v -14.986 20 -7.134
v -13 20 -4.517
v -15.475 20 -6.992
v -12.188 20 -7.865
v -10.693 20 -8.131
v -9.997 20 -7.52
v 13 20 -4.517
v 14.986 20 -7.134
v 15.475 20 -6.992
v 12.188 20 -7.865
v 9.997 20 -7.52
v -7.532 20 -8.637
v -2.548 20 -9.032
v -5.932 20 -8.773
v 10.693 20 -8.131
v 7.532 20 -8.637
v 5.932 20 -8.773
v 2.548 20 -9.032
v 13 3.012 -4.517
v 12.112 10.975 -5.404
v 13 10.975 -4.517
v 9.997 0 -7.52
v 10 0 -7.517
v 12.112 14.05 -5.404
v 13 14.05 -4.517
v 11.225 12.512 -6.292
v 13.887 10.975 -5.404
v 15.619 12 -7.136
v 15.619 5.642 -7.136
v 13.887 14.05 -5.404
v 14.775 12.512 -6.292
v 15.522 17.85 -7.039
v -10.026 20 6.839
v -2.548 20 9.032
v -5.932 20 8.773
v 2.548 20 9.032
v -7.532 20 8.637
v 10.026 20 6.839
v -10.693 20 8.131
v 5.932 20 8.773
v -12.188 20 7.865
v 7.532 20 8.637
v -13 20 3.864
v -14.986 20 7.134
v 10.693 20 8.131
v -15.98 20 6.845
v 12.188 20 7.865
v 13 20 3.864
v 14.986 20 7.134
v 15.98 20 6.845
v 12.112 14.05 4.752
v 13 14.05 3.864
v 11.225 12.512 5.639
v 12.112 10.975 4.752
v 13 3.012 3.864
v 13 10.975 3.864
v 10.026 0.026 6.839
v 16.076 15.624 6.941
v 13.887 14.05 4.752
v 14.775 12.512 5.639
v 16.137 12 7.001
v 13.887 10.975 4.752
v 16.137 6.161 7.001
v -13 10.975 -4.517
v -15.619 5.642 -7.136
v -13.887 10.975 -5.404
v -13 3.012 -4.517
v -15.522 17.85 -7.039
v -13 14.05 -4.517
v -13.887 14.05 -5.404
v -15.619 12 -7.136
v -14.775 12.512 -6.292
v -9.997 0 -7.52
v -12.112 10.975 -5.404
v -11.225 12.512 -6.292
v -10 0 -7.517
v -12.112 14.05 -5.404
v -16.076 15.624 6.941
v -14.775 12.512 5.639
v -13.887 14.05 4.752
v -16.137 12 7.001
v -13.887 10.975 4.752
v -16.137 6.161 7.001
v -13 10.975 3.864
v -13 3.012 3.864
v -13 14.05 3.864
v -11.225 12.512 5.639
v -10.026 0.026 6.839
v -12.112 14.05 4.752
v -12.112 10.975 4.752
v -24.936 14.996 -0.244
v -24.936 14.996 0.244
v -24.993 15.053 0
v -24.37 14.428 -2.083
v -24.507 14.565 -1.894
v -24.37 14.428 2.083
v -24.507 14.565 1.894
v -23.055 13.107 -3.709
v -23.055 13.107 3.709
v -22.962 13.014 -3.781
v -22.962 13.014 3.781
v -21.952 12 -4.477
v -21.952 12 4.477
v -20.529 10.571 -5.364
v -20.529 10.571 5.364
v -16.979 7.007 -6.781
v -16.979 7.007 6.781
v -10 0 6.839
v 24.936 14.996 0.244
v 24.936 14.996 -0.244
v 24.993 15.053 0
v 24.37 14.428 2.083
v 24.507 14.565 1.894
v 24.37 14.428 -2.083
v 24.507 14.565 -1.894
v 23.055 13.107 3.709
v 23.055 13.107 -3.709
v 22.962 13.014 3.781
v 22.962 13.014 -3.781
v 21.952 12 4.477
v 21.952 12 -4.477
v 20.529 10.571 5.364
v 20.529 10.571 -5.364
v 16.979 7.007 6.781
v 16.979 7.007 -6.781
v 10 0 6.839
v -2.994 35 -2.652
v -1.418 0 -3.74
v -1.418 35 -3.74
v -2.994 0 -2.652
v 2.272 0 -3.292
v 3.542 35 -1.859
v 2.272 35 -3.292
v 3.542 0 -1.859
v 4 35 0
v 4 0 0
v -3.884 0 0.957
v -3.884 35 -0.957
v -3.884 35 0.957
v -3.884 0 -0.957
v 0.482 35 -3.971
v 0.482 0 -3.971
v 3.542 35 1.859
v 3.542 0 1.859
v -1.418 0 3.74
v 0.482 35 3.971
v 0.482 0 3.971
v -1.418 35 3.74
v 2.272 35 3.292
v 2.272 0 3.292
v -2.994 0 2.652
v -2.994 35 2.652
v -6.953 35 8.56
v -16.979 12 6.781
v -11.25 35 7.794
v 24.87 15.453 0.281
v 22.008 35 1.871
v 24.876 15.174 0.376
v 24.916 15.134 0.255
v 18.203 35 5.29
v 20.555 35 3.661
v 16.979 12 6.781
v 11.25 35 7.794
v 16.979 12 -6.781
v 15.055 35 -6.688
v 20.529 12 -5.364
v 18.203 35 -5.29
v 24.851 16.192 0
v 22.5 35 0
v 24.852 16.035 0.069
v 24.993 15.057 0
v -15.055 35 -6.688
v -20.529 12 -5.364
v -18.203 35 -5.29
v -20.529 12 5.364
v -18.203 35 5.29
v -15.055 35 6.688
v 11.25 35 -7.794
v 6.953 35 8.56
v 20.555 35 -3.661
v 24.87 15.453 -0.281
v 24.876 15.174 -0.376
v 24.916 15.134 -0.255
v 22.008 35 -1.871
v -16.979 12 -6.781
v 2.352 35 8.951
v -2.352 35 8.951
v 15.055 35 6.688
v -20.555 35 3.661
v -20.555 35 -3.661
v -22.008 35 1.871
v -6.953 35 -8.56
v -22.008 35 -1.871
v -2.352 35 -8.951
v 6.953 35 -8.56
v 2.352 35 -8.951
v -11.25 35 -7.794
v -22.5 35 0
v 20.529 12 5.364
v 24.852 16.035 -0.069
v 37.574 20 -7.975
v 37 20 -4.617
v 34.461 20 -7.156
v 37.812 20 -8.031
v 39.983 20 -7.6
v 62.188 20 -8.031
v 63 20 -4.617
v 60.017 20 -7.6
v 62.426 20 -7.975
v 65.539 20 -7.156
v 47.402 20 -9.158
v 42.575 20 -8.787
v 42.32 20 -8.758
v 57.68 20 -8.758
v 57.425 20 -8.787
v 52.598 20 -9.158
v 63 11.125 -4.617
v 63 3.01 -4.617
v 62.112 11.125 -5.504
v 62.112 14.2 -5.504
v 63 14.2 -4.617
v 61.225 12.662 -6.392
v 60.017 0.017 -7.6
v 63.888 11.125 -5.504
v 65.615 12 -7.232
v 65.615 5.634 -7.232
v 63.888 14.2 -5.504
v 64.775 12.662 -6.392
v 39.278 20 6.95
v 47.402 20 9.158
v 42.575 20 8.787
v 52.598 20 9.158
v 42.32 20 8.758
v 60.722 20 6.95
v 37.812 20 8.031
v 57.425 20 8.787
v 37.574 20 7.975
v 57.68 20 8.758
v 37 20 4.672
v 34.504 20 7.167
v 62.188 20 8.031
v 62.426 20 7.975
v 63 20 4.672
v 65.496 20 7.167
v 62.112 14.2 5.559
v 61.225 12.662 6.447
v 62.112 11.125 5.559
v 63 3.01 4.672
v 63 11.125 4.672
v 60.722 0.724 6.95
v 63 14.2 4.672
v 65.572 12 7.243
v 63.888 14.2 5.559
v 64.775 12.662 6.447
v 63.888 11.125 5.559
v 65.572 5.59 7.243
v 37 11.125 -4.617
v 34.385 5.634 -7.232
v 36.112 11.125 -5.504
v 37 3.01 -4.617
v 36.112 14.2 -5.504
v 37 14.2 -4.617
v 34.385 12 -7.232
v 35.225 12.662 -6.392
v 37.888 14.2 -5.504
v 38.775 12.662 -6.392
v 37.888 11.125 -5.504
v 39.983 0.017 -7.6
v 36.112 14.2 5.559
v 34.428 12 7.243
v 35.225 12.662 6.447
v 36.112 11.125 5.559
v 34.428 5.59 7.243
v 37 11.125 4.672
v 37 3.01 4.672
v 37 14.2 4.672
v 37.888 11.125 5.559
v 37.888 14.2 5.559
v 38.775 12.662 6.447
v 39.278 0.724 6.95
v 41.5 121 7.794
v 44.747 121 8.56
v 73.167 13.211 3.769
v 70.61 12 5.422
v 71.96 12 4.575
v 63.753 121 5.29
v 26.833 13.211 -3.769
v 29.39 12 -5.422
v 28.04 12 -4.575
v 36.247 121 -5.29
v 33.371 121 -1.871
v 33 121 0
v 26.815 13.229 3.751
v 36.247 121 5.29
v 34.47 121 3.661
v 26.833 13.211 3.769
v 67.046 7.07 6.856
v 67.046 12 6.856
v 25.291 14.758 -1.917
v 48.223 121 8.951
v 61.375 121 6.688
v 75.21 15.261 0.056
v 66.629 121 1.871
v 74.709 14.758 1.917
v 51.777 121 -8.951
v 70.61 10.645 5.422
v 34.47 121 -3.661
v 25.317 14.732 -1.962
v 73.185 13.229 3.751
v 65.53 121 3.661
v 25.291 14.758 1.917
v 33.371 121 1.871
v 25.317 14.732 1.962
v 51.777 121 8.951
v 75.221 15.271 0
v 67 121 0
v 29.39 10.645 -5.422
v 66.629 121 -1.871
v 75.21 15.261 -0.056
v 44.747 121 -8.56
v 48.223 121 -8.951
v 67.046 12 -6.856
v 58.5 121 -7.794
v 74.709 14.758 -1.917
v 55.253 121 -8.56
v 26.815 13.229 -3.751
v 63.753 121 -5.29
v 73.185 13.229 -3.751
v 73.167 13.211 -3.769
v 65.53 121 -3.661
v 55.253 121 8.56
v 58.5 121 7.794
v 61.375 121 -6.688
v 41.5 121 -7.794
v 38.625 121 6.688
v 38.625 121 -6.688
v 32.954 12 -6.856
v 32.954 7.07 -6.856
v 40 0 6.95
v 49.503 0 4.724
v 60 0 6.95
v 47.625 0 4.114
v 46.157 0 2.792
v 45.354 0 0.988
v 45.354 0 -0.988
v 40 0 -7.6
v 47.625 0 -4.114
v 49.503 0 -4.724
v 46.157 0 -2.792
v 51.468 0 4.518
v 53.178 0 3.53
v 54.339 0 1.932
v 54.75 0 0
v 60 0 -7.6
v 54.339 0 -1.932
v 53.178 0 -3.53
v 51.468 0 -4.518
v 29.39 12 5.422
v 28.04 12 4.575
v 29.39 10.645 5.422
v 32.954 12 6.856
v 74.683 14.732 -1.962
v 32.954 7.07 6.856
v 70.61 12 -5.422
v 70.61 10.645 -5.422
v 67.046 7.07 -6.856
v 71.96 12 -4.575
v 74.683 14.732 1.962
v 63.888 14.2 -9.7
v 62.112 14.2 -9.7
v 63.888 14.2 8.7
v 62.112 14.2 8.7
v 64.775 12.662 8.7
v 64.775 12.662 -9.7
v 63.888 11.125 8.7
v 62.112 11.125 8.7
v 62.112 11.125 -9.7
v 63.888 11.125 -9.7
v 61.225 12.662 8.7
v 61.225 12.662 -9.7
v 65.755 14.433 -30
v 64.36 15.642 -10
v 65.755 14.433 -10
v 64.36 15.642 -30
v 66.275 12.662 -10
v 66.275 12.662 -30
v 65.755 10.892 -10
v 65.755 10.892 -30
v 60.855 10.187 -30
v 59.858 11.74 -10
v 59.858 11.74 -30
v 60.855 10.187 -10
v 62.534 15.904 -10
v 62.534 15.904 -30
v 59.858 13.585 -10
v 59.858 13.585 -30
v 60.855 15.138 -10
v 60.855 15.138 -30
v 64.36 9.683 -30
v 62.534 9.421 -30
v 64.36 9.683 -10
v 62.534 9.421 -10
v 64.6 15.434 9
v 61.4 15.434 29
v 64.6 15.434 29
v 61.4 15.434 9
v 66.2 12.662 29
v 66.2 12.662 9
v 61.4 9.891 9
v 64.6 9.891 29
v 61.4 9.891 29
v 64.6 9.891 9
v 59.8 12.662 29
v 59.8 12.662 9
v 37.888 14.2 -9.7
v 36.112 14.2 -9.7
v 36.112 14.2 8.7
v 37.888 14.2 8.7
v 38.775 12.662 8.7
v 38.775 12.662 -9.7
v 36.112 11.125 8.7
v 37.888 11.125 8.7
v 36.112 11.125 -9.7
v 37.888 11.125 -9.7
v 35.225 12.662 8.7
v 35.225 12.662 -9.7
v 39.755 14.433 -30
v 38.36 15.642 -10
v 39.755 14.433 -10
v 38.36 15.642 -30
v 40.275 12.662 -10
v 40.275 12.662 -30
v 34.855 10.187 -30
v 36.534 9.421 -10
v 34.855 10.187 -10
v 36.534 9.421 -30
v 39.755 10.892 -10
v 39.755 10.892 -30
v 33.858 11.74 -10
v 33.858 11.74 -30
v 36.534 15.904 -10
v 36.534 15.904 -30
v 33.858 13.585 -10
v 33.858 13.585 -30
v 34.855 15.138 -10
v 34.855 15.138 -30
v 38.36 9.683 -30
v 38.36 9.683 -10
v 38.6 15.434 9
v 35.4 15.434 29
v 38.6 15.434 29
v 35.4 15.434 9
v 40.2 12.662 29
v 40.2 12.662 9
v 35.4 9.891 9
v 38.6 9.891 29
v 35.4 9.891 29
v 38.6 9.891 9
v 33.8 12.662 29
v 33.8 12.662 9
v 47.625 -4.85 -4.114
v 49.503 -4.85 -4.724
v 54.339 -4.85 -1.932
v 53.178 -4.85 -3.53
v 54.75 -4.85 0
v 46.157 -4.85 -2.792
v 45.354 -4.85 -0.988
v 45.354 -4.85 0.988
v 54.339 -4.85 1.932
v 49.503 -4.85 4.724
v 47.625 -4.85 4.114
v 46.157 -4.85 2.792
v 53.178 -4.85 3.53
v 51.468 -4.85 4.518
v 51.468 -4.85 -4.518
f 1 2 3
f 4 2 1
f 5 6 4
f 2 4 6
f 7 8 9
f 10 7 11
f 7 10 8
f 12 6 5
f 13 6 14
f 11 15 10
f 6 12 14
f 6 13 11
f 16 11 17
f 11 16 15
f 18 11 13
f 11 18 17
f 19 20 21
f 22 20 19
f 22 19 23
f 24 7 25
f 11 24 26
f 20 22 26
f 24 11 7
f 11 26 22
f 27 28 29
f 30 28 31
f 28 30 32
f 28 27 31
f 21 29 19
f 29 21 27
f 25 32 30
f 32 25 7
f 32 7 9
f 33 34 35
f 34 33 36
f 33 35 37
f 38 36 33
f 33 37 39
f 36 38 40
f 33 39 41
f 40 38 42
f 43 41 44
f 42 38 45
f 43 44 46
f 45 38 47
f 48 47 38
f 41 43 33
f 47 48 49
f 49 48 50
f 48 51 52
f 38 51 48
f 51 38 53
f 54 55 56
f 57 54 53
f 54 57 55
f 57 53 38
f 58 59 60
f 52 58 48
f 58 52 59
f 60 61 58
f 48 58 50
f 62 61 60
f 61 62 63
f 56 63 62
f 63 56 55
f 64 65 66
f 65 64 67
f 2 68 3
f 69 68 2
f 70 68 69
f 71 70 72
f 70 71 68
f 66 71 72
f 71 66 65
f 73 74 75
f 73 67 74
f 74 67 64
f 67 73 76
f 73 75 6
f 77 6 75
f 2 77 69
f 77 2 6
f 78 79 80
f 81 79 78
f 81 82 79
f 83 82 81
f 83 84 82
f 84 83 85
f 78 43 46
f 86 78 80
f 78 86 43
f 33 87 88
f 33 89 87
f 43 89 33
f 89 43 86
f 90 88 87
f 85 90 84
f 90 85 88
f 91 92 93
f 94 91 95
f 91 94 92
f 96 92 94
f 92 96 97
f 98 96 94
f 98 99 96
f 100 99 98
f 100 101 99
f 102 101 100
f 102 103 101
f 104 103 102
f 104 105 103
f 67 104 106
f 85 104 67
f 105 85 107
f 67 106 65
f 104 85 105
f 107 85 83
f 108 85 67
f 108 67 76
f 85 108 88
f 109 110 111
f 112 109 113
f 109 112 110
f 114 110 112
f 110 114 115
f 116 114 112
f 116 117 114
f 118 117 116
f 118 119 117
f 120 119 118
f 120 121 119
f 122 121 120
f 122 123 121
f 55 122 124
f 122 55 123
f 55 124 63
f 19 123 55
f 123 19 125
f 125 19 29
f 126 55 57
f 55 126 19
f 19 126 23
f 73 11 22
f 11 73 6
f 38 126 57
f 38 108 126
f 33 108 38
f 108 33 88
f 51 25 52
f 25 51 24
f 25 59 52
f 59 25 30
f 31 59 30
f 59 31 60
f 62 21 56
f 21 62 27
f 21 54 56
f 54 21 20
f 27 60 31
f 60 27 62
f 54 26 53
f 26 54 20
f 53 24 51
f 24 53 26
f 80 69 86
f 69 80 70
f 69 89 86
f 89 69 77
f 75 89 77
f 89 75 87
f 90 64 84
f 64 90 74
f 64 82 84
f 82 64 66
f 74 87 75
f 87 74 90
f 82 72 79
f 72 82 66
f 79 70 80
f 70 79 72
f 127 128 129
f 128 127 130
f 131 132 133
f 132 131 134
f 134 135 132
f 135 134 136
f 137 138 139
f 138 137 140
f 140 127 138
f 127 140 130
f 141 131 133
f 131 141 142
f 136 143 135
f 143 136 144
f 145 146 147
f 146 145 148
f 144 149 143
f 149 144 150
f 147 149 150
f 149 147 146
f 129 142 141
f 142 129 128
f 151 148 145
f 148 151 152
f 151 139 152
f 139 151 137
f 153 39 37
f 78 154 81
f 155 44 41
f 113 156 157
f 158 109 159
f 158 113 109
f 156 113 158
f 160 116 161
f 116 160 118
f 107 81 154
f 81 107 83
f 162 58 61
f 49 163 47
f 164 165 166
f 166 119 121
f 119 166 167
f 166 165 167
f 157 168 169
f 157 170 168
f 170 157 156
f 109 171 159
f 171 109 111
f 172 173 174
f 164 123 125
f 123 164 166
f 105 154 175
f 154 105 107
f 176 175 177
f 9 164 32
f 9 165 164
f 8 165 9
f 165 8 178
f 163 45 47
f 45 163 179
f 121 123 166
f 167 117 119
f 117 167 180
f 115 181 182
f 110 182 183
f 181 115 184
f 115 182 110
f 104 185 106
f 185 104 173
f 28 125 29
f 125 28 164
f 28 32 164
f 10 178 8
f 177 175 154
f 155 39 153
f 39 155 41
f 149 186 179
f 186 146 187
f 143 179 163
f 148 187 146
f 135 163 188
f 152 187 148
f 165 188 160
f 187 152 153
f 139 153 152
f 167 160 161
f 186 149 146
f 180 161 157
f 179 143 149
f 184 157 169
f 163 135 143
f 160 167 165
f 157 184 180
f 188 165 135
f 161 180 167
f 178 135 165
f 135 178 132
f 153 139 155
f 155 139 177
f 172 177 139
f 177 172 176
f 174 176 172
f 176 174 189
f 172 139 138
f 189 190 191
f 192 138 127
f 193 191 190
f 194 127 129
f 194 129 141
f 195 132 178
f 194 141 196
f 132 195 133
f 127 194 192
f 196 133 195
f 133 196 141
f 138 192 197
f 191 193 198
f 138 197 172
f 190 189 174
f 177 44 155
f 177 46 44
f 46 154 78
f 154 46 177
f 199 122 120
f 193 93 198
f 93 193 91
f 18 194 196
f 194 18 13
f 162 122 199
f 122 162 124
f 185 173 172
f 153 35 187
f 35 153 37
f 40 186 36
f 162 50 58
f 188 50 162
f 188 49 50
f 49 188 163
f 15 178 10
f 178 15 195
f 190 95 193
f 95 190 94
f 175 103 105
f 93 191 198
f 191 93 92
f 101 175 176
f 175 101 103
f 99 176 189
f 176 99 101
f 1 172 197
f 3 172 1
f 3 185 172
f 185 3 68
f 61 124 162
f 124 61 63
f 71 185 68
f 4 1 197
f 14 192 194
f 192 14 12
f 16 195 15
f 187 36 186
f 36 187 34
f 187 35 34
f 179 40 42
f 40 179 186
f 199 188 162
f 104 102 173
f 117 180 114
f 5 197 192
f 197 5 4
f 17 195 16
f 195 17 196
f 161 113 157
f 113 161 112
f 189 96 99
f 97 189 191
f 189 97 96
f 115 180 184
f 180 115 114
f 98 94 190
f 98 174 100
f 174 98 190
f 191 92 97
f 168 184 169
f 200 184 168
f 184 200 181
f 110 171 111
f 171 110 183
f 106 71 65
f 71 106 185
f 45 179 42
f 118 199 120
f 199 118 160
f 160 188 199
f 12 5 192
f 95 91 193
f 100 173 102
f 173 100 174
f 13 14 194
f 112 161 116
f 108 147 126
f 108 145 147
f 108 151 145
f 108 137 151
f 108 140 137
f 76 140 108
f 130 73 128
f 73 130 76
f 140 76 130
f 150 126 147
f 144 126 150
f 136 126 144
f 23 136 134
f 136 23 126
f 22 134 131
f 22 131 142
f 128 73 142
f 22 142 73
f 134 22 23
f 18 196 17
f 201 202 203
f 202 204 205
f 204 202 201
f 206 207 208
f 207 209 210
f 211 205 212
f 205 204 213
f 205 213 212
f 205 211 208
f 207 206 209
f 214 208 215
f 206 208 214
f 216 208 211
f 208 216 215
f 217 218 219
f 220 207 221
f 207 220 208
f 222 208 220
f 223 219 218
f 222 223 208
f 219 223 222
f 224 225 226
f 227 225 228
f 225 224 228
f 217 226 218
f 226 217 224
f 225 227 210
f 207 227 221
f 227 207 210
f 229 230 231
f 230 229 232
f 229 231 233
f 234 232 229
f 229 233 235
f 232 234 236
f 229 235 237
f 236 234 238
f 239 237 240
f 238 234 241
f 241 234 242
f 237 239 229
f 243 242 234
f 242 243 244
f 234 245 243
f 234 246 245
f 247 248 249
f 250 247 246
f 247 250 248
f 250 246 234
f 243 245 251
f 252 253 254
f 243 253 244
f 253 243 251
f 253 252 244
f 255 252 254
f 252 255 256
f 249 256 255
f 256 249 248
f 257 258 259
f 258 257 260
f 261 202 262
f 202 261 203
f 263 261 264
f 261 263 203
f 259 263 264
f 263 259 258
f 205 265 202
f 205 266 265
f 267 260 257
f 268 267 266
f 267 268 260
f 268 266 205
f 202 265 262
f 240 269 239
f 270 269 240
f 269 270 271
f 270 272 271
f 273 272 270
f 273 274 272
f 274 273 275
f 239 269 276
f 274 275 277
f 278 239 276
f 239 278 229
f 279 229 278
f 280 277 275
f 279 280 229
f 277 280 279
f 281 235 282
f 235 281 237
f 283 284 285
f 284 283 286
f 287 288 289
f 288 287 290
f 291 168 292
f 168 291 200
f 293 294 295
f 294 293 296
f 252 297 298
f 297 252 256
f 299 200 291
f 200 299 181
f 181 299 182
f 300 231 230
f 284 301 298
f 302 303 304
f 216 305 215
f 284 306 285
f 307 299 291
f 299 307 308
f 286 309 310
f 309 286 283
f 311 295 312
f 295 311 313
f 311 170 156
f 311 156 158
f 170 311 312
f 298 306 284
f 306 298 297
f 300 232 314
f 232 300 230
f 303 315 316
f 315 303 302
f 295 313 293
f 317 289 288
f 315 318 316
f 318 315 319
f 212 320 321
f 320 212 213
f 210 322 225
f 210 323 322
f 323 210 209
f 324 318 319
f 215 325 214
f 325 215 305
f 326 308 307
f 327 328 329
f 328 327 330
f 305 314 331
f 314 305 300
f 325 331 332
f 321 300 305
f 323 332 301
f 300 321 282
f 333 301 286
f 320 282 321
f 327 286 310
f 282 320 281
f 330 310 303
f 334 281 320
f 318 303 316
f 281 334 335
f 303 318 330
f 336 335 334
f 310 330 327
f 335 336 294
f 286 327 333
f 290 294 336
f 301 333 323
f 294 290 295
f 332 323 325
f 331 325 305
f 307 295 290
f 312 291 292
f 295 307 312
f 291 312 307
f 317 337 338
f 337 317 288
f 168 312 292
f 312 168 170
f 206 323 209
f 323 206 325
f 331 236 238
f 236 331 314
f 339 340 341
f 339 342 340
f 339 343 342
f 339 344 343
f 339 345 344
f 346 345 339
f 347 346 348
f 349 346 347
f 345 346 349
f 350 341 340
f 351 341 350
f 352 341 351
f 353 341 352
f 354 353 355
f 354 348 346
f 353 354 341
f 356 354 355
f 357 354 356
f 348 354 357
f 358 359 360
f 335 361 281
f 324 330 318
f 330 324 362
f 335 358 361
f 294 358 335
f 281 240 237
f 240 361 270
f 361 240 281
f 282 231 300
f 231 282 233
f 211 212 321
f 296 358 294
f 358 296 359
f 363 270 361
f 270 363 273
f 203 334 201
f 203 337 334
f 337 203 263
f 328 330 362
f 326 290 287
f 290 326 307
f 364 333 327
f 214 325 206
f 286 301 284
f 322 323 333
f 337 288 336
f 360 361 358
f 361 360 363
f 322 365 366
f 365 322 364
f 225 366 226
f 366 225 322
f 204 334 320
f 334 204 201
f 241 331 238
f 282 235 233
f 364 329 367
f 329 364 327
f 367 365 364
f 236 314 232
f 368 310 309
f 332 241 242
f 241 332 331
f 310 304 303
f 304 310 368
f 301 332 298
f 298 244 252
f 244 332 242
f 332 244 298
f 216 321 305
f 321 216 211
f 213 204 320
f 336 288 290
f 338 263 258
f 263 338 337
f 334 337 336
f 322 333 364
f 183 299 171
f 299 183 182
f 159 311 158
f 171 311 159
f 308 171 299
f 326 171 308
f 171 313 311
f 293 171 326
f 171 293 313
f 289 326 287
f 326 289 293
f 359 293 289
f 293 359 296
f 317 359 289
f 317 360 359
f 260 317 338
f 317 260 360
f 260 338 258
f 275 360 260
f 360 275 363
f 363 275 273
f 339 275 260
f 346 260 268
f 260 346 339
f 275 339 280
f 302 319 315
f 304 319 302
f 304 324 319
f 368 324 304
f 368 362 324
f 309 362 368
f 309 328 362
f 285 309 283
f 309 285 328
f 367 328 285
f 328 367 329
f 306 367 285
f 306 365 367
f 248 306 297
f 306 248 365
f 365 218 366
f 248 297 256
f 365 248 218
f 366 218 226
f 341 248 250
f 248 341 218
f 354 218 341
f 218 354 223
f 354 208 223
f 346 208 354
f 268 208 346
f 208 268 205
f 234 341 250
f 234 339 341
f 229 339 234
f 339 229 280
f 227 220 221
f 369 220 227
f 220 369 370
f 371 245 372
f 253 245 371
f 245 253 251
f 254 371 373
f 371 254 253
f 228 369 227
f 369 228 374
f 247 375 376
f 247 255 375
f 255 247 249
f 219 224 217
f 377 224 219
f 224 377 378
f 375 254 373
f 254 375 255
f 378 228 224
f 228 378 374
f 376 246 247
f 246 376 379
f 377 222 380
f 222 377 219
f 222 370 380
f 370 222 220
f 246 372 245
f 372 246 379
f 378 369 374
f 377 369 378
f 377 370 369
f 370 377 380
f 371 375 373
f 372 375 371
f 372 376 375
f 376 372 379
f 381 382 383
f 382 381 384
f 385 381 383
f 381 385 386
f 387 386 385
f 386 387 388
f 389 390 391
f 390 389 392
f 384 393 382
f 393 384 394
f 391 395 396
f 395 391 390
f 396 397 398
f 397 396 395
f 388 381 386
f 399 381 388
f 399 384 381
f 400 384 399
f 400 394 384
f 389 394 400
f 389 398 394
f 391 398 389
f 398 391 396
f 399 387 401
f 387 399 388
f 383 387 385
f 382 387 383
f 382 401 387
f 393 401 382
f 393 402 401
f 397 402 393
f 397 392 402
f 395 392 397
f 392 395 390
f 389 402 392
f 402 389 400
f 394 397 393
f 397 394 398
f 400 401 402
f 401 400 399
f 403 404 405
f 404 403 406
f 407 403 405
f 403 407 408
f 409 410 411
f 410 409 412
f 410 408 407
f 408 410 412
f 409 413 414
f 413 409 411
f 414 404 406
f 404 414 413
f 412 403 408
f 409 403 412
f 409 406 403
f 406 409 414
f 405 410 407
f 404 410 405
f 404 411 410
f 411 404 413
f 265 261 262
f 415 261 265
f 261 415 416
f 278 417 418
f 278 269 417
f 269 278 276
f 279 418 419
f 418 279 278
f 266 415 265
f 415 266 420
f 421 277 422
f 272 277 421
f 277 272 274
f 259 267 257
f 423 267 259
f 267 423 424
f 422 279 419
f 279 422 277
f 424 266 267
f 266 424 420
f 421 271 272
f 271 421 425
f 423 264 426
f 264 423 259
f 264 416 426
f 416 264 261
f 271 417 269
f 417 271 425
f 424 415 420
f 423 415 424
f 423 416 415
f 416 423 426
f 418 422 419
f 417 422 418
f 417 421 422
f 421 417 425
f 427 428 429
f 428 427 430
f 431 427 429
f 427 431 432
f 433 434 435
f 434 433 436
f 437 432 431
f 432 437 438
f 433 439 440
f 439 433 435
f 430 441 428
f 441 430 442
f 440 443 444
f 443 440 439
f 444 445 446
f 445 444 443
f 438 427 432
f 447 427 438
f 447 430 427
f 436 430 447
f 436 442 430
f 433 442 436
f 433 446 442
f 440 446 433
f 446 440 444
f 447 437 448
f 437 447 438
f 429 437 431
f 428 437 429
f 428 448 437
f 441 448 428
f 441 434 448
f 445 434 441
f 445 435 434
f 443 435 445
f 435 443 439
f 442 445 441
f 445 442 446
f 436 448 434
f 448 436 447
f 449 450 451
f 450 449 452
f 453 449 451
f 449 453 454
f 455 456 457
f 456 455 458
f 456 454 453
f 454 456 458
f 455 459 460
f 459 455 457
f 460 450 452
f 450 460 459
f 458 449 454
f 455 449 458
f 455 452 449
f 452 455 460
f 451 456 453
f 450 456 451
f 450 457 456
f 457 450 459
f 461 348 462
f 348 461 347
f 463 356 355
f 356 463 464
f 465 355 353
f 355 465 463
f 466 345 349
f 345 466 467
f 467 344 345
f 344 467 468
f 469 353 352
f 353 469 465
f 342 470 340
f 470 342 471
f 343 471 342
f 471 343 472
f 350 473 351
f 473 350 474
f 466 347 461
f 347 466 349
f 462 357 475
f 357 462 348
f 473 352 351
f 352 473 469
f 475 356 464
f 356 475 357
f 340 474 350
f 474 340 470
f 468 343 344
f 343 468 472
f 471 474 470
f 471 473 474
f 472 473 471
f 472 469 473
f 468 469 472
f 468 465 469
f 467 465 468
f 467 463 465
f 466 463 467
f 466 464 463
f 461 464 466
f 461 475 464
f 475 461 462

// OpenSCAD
// file: config.scad
/**
 * config.scad
 * 
 * Constants and common methods used for the multi-copter
 * 
 */

//wire openning
wireDiameter = 8;


// suavizar las superficies curvas
//$fs= 1 ; 
//$fa= 1 ; 


///////////// armMount
entryWidth = 50.75/2;
entryHeight = 18.25/2;
entryDepth = 12;

outputWidth = 45/2; //49/2;
outputHeight = 18/2;
outputDepth = 8 +15; //For modelling, this is the position of the further ellipse


armLength = 184; //from the beginning of armMount/malePart to the center of motorMount

//auxiliary method
module oval(w,h, height, center = false) {
 scale([1, h/w, 1]) cylinder(h=height, r=w, center=center);
}

//auxiliary method
module ellipsoid(w,h, center = false) {
 scale([1, h/w, 0.8]) sphere(r=w, $fn=60);
}


//auxiliary method
module nestedHull()
{
  for(i=[0:$children-2])
    hull()
    {
      children(i);
      children(i+1);
    }
}

//hexer module
scale = 1.15;
hexagon_d = 10*scale;
hexagon_x = 9*scale;
hexagon_y = 5*scale;
hexagon_h = 50; // centered

min_x = - 150;
max_x = 150;
min_y = -100;
max_y = 100;

wall_t = 5;
module hollowify()
difference(convexity=10){
    children(0); 
    linear_extrude(center=true,convexity=10){
        difference(){
            // hexagon array
            for(
                x=[min_x:hexagon_x*2:max_x], 
                y=[min_y:hexagon_y*2:max_y]
            ) translate([x, y, 0]) {
                circle(d=hexagon_d,  center=true, $fn=6);
                translate([hexagon_x, hexagon_y, 0]) circle(d=hexagon_d, center=true, $fn=6);
            }

            minkowski(){
                difference(){
                    translate([min_x, min_y, 0])
                        square([hexagon_x + max_x-min_x, hexagon_y + max_y-min_y]);
                    projection() children(0); 
                }
                circle(r=wall_t);
            }
        }
    }
}
// main file
/**
 * armMount.scad
 * 
 * This is the joint part for any arm in the copter
 * 
 * Created by Diego Viejo after the idea of OpenRC copter from Daniel Noree
 * 13/May/2015
 * 
 */

include<config.scad>

// // suavizar las superficies curvas
// $fs= 1 ; 
// $fa= 1 ; 
// 

module armMount(action, extraHole=0)
{
    if(action == "add")
    {
        hull()
        {
            oval(w=entryWidth, h = entryHeight, height=entryDepth);
            translate([0, 0, entryDepth + outputDepth - 0.1])
                oval(w=outputWidth, h=outputHeight, height=0.1);
        }
    }
    else if(action == "remove")
    {
        //housing
        //left
        hull()
        {
            translate([-10-20, -10, -0.1]) cube([20, 20, 0.1]);
            translate([-25.1-10, -10, 25]) cube([0.1, 20, 0.1]); 
        }
        //right
        mirror([1, 0, 0]) hull()
        {
            translate([-10-20, -10, -0.1]) cube([20, 20, 0.1]);
            translate([-25.1-10, -10, 25]) cube([0.1, 20, 0.1]);
        }
        translate([-15, 14.5/2+0.27, -1]) cube([30, 5, 20+1]);
        translate([-15, -14.5/2-5+0.41125, -1]) cube([30, 5, 20+1]);
        for(i=[1, -1])
        {
            translate([13*i, 14.6/2-sqrt(2.5*2.5+2.5*2.5)+0.7525, -1]) rotate(45) cube([5, 5, 20+1]);
            translate([13*i, -14.6/2-sqrt(2.5*2.5+2.5*2.5)-0.1, -1]) rotate(45) cube([5, 5, 20+1]);
        }
        //end housing
    } else //holes
    {
        //wire hole
        translate([0, 0, -5]) cylinder(d = wireDiameter+extraHole, h = 10 +outputDepth + entryDepth);
        
        //attaching holes
        for(i=[1, -1])
        {
            translate([13*i, -8.7, 12.5125]) rotate([-90, 0, 0]) cylinder(d=3.55, h = 18.4);
            translate([13*i, 30, 12.5125]) rotate([90, 0, 0]) cylinder(d=6.55, h = 20);
            translate([13*i, -29, 12.5125]) rotate([-90, 0, 0]) cylinder(d=6.4, h = 20, $fn=6);
        }
    }
}

*color("red")
translate([0, 36.30+5, -71.4]) //z=106.4
{
    rotate([0, -90, 0]) import("../stl/OpenRC_Quad_Alpha_Arm_Part_1.stl");
    rotate([180, -90, 0]) import("../stl/OpenRC_Quad_Alpha_Arm_Part_2.stl");
}

module malePart()
   rotate([-90, 0, 0]) 
    difference()
    {
        armMount(action="add");
        armMount(action="remove");
        armMount(action="holes");
    }


module femalePart() {
   rotate([-90, 0, 0])
   {
        difference()
        {
            hull()
            {
                oval(w=entryWidth+0.1, h = entryHeight+0.1, height=entryDepth);
                translate([0, 0, entryDepth + outputDepth - 0.1])
                    oval(w=outputWidth+0.1, h=outputHeight+0.1, height=0.1);
                hull()
                {
                    translate([0, 0, entryDepth + outputDepth - 0.1])
                        oval(w=outputWidth, h=outputHeight, height=0.1);

                    translate([0, 0, armLength-44-20])
                        oval(w=32/2+10*10/100, h=outputHeight, height=1);
                }
            }
            
            //left
            hull()
            {
                translate([-10-20, -10, -0.1]) cube([20, 20, 0.1]);
                translate([-30.1-10, -10, 30]) cube([0.1, 20, 0.1]);
            }
            //right
            mirror([1, 0, 0]) hull()
            {
                translate([-10-20, -10, -0.1]) cube([20, 20, 0.1]);
                translate([-30.1-10, -10, 30]) cube([0.1, 20, 0.1]);
            }
            translate([-15, 14.5/2+0.35, -1]) cube([30, 5, 20+1]);
            translate([-15, -14.5/2-5+0.3, -1]) cube([30, 5, 20+1]);
            for(i=[1, -1])
            {
                translate([13*i, 14.6/2-sqrt(2.5*2.5+2.5*2.5)+0.8525, -1]) rotate(45) cube([4.5, 4.5, 20+1]);
                translate([13*i, -14.6/2-sqrt(2.5*2.5+2.5*2.5)-0.2, -1]) rotate(45) cube([4.5, 4.5, 20+1]);
            }
        }
        translate([0, 0, 0.15]) armMount(action="holes", extraHole=1.5);
   }
}

malePart();
translate([50, 0, 0]) femalePart();
